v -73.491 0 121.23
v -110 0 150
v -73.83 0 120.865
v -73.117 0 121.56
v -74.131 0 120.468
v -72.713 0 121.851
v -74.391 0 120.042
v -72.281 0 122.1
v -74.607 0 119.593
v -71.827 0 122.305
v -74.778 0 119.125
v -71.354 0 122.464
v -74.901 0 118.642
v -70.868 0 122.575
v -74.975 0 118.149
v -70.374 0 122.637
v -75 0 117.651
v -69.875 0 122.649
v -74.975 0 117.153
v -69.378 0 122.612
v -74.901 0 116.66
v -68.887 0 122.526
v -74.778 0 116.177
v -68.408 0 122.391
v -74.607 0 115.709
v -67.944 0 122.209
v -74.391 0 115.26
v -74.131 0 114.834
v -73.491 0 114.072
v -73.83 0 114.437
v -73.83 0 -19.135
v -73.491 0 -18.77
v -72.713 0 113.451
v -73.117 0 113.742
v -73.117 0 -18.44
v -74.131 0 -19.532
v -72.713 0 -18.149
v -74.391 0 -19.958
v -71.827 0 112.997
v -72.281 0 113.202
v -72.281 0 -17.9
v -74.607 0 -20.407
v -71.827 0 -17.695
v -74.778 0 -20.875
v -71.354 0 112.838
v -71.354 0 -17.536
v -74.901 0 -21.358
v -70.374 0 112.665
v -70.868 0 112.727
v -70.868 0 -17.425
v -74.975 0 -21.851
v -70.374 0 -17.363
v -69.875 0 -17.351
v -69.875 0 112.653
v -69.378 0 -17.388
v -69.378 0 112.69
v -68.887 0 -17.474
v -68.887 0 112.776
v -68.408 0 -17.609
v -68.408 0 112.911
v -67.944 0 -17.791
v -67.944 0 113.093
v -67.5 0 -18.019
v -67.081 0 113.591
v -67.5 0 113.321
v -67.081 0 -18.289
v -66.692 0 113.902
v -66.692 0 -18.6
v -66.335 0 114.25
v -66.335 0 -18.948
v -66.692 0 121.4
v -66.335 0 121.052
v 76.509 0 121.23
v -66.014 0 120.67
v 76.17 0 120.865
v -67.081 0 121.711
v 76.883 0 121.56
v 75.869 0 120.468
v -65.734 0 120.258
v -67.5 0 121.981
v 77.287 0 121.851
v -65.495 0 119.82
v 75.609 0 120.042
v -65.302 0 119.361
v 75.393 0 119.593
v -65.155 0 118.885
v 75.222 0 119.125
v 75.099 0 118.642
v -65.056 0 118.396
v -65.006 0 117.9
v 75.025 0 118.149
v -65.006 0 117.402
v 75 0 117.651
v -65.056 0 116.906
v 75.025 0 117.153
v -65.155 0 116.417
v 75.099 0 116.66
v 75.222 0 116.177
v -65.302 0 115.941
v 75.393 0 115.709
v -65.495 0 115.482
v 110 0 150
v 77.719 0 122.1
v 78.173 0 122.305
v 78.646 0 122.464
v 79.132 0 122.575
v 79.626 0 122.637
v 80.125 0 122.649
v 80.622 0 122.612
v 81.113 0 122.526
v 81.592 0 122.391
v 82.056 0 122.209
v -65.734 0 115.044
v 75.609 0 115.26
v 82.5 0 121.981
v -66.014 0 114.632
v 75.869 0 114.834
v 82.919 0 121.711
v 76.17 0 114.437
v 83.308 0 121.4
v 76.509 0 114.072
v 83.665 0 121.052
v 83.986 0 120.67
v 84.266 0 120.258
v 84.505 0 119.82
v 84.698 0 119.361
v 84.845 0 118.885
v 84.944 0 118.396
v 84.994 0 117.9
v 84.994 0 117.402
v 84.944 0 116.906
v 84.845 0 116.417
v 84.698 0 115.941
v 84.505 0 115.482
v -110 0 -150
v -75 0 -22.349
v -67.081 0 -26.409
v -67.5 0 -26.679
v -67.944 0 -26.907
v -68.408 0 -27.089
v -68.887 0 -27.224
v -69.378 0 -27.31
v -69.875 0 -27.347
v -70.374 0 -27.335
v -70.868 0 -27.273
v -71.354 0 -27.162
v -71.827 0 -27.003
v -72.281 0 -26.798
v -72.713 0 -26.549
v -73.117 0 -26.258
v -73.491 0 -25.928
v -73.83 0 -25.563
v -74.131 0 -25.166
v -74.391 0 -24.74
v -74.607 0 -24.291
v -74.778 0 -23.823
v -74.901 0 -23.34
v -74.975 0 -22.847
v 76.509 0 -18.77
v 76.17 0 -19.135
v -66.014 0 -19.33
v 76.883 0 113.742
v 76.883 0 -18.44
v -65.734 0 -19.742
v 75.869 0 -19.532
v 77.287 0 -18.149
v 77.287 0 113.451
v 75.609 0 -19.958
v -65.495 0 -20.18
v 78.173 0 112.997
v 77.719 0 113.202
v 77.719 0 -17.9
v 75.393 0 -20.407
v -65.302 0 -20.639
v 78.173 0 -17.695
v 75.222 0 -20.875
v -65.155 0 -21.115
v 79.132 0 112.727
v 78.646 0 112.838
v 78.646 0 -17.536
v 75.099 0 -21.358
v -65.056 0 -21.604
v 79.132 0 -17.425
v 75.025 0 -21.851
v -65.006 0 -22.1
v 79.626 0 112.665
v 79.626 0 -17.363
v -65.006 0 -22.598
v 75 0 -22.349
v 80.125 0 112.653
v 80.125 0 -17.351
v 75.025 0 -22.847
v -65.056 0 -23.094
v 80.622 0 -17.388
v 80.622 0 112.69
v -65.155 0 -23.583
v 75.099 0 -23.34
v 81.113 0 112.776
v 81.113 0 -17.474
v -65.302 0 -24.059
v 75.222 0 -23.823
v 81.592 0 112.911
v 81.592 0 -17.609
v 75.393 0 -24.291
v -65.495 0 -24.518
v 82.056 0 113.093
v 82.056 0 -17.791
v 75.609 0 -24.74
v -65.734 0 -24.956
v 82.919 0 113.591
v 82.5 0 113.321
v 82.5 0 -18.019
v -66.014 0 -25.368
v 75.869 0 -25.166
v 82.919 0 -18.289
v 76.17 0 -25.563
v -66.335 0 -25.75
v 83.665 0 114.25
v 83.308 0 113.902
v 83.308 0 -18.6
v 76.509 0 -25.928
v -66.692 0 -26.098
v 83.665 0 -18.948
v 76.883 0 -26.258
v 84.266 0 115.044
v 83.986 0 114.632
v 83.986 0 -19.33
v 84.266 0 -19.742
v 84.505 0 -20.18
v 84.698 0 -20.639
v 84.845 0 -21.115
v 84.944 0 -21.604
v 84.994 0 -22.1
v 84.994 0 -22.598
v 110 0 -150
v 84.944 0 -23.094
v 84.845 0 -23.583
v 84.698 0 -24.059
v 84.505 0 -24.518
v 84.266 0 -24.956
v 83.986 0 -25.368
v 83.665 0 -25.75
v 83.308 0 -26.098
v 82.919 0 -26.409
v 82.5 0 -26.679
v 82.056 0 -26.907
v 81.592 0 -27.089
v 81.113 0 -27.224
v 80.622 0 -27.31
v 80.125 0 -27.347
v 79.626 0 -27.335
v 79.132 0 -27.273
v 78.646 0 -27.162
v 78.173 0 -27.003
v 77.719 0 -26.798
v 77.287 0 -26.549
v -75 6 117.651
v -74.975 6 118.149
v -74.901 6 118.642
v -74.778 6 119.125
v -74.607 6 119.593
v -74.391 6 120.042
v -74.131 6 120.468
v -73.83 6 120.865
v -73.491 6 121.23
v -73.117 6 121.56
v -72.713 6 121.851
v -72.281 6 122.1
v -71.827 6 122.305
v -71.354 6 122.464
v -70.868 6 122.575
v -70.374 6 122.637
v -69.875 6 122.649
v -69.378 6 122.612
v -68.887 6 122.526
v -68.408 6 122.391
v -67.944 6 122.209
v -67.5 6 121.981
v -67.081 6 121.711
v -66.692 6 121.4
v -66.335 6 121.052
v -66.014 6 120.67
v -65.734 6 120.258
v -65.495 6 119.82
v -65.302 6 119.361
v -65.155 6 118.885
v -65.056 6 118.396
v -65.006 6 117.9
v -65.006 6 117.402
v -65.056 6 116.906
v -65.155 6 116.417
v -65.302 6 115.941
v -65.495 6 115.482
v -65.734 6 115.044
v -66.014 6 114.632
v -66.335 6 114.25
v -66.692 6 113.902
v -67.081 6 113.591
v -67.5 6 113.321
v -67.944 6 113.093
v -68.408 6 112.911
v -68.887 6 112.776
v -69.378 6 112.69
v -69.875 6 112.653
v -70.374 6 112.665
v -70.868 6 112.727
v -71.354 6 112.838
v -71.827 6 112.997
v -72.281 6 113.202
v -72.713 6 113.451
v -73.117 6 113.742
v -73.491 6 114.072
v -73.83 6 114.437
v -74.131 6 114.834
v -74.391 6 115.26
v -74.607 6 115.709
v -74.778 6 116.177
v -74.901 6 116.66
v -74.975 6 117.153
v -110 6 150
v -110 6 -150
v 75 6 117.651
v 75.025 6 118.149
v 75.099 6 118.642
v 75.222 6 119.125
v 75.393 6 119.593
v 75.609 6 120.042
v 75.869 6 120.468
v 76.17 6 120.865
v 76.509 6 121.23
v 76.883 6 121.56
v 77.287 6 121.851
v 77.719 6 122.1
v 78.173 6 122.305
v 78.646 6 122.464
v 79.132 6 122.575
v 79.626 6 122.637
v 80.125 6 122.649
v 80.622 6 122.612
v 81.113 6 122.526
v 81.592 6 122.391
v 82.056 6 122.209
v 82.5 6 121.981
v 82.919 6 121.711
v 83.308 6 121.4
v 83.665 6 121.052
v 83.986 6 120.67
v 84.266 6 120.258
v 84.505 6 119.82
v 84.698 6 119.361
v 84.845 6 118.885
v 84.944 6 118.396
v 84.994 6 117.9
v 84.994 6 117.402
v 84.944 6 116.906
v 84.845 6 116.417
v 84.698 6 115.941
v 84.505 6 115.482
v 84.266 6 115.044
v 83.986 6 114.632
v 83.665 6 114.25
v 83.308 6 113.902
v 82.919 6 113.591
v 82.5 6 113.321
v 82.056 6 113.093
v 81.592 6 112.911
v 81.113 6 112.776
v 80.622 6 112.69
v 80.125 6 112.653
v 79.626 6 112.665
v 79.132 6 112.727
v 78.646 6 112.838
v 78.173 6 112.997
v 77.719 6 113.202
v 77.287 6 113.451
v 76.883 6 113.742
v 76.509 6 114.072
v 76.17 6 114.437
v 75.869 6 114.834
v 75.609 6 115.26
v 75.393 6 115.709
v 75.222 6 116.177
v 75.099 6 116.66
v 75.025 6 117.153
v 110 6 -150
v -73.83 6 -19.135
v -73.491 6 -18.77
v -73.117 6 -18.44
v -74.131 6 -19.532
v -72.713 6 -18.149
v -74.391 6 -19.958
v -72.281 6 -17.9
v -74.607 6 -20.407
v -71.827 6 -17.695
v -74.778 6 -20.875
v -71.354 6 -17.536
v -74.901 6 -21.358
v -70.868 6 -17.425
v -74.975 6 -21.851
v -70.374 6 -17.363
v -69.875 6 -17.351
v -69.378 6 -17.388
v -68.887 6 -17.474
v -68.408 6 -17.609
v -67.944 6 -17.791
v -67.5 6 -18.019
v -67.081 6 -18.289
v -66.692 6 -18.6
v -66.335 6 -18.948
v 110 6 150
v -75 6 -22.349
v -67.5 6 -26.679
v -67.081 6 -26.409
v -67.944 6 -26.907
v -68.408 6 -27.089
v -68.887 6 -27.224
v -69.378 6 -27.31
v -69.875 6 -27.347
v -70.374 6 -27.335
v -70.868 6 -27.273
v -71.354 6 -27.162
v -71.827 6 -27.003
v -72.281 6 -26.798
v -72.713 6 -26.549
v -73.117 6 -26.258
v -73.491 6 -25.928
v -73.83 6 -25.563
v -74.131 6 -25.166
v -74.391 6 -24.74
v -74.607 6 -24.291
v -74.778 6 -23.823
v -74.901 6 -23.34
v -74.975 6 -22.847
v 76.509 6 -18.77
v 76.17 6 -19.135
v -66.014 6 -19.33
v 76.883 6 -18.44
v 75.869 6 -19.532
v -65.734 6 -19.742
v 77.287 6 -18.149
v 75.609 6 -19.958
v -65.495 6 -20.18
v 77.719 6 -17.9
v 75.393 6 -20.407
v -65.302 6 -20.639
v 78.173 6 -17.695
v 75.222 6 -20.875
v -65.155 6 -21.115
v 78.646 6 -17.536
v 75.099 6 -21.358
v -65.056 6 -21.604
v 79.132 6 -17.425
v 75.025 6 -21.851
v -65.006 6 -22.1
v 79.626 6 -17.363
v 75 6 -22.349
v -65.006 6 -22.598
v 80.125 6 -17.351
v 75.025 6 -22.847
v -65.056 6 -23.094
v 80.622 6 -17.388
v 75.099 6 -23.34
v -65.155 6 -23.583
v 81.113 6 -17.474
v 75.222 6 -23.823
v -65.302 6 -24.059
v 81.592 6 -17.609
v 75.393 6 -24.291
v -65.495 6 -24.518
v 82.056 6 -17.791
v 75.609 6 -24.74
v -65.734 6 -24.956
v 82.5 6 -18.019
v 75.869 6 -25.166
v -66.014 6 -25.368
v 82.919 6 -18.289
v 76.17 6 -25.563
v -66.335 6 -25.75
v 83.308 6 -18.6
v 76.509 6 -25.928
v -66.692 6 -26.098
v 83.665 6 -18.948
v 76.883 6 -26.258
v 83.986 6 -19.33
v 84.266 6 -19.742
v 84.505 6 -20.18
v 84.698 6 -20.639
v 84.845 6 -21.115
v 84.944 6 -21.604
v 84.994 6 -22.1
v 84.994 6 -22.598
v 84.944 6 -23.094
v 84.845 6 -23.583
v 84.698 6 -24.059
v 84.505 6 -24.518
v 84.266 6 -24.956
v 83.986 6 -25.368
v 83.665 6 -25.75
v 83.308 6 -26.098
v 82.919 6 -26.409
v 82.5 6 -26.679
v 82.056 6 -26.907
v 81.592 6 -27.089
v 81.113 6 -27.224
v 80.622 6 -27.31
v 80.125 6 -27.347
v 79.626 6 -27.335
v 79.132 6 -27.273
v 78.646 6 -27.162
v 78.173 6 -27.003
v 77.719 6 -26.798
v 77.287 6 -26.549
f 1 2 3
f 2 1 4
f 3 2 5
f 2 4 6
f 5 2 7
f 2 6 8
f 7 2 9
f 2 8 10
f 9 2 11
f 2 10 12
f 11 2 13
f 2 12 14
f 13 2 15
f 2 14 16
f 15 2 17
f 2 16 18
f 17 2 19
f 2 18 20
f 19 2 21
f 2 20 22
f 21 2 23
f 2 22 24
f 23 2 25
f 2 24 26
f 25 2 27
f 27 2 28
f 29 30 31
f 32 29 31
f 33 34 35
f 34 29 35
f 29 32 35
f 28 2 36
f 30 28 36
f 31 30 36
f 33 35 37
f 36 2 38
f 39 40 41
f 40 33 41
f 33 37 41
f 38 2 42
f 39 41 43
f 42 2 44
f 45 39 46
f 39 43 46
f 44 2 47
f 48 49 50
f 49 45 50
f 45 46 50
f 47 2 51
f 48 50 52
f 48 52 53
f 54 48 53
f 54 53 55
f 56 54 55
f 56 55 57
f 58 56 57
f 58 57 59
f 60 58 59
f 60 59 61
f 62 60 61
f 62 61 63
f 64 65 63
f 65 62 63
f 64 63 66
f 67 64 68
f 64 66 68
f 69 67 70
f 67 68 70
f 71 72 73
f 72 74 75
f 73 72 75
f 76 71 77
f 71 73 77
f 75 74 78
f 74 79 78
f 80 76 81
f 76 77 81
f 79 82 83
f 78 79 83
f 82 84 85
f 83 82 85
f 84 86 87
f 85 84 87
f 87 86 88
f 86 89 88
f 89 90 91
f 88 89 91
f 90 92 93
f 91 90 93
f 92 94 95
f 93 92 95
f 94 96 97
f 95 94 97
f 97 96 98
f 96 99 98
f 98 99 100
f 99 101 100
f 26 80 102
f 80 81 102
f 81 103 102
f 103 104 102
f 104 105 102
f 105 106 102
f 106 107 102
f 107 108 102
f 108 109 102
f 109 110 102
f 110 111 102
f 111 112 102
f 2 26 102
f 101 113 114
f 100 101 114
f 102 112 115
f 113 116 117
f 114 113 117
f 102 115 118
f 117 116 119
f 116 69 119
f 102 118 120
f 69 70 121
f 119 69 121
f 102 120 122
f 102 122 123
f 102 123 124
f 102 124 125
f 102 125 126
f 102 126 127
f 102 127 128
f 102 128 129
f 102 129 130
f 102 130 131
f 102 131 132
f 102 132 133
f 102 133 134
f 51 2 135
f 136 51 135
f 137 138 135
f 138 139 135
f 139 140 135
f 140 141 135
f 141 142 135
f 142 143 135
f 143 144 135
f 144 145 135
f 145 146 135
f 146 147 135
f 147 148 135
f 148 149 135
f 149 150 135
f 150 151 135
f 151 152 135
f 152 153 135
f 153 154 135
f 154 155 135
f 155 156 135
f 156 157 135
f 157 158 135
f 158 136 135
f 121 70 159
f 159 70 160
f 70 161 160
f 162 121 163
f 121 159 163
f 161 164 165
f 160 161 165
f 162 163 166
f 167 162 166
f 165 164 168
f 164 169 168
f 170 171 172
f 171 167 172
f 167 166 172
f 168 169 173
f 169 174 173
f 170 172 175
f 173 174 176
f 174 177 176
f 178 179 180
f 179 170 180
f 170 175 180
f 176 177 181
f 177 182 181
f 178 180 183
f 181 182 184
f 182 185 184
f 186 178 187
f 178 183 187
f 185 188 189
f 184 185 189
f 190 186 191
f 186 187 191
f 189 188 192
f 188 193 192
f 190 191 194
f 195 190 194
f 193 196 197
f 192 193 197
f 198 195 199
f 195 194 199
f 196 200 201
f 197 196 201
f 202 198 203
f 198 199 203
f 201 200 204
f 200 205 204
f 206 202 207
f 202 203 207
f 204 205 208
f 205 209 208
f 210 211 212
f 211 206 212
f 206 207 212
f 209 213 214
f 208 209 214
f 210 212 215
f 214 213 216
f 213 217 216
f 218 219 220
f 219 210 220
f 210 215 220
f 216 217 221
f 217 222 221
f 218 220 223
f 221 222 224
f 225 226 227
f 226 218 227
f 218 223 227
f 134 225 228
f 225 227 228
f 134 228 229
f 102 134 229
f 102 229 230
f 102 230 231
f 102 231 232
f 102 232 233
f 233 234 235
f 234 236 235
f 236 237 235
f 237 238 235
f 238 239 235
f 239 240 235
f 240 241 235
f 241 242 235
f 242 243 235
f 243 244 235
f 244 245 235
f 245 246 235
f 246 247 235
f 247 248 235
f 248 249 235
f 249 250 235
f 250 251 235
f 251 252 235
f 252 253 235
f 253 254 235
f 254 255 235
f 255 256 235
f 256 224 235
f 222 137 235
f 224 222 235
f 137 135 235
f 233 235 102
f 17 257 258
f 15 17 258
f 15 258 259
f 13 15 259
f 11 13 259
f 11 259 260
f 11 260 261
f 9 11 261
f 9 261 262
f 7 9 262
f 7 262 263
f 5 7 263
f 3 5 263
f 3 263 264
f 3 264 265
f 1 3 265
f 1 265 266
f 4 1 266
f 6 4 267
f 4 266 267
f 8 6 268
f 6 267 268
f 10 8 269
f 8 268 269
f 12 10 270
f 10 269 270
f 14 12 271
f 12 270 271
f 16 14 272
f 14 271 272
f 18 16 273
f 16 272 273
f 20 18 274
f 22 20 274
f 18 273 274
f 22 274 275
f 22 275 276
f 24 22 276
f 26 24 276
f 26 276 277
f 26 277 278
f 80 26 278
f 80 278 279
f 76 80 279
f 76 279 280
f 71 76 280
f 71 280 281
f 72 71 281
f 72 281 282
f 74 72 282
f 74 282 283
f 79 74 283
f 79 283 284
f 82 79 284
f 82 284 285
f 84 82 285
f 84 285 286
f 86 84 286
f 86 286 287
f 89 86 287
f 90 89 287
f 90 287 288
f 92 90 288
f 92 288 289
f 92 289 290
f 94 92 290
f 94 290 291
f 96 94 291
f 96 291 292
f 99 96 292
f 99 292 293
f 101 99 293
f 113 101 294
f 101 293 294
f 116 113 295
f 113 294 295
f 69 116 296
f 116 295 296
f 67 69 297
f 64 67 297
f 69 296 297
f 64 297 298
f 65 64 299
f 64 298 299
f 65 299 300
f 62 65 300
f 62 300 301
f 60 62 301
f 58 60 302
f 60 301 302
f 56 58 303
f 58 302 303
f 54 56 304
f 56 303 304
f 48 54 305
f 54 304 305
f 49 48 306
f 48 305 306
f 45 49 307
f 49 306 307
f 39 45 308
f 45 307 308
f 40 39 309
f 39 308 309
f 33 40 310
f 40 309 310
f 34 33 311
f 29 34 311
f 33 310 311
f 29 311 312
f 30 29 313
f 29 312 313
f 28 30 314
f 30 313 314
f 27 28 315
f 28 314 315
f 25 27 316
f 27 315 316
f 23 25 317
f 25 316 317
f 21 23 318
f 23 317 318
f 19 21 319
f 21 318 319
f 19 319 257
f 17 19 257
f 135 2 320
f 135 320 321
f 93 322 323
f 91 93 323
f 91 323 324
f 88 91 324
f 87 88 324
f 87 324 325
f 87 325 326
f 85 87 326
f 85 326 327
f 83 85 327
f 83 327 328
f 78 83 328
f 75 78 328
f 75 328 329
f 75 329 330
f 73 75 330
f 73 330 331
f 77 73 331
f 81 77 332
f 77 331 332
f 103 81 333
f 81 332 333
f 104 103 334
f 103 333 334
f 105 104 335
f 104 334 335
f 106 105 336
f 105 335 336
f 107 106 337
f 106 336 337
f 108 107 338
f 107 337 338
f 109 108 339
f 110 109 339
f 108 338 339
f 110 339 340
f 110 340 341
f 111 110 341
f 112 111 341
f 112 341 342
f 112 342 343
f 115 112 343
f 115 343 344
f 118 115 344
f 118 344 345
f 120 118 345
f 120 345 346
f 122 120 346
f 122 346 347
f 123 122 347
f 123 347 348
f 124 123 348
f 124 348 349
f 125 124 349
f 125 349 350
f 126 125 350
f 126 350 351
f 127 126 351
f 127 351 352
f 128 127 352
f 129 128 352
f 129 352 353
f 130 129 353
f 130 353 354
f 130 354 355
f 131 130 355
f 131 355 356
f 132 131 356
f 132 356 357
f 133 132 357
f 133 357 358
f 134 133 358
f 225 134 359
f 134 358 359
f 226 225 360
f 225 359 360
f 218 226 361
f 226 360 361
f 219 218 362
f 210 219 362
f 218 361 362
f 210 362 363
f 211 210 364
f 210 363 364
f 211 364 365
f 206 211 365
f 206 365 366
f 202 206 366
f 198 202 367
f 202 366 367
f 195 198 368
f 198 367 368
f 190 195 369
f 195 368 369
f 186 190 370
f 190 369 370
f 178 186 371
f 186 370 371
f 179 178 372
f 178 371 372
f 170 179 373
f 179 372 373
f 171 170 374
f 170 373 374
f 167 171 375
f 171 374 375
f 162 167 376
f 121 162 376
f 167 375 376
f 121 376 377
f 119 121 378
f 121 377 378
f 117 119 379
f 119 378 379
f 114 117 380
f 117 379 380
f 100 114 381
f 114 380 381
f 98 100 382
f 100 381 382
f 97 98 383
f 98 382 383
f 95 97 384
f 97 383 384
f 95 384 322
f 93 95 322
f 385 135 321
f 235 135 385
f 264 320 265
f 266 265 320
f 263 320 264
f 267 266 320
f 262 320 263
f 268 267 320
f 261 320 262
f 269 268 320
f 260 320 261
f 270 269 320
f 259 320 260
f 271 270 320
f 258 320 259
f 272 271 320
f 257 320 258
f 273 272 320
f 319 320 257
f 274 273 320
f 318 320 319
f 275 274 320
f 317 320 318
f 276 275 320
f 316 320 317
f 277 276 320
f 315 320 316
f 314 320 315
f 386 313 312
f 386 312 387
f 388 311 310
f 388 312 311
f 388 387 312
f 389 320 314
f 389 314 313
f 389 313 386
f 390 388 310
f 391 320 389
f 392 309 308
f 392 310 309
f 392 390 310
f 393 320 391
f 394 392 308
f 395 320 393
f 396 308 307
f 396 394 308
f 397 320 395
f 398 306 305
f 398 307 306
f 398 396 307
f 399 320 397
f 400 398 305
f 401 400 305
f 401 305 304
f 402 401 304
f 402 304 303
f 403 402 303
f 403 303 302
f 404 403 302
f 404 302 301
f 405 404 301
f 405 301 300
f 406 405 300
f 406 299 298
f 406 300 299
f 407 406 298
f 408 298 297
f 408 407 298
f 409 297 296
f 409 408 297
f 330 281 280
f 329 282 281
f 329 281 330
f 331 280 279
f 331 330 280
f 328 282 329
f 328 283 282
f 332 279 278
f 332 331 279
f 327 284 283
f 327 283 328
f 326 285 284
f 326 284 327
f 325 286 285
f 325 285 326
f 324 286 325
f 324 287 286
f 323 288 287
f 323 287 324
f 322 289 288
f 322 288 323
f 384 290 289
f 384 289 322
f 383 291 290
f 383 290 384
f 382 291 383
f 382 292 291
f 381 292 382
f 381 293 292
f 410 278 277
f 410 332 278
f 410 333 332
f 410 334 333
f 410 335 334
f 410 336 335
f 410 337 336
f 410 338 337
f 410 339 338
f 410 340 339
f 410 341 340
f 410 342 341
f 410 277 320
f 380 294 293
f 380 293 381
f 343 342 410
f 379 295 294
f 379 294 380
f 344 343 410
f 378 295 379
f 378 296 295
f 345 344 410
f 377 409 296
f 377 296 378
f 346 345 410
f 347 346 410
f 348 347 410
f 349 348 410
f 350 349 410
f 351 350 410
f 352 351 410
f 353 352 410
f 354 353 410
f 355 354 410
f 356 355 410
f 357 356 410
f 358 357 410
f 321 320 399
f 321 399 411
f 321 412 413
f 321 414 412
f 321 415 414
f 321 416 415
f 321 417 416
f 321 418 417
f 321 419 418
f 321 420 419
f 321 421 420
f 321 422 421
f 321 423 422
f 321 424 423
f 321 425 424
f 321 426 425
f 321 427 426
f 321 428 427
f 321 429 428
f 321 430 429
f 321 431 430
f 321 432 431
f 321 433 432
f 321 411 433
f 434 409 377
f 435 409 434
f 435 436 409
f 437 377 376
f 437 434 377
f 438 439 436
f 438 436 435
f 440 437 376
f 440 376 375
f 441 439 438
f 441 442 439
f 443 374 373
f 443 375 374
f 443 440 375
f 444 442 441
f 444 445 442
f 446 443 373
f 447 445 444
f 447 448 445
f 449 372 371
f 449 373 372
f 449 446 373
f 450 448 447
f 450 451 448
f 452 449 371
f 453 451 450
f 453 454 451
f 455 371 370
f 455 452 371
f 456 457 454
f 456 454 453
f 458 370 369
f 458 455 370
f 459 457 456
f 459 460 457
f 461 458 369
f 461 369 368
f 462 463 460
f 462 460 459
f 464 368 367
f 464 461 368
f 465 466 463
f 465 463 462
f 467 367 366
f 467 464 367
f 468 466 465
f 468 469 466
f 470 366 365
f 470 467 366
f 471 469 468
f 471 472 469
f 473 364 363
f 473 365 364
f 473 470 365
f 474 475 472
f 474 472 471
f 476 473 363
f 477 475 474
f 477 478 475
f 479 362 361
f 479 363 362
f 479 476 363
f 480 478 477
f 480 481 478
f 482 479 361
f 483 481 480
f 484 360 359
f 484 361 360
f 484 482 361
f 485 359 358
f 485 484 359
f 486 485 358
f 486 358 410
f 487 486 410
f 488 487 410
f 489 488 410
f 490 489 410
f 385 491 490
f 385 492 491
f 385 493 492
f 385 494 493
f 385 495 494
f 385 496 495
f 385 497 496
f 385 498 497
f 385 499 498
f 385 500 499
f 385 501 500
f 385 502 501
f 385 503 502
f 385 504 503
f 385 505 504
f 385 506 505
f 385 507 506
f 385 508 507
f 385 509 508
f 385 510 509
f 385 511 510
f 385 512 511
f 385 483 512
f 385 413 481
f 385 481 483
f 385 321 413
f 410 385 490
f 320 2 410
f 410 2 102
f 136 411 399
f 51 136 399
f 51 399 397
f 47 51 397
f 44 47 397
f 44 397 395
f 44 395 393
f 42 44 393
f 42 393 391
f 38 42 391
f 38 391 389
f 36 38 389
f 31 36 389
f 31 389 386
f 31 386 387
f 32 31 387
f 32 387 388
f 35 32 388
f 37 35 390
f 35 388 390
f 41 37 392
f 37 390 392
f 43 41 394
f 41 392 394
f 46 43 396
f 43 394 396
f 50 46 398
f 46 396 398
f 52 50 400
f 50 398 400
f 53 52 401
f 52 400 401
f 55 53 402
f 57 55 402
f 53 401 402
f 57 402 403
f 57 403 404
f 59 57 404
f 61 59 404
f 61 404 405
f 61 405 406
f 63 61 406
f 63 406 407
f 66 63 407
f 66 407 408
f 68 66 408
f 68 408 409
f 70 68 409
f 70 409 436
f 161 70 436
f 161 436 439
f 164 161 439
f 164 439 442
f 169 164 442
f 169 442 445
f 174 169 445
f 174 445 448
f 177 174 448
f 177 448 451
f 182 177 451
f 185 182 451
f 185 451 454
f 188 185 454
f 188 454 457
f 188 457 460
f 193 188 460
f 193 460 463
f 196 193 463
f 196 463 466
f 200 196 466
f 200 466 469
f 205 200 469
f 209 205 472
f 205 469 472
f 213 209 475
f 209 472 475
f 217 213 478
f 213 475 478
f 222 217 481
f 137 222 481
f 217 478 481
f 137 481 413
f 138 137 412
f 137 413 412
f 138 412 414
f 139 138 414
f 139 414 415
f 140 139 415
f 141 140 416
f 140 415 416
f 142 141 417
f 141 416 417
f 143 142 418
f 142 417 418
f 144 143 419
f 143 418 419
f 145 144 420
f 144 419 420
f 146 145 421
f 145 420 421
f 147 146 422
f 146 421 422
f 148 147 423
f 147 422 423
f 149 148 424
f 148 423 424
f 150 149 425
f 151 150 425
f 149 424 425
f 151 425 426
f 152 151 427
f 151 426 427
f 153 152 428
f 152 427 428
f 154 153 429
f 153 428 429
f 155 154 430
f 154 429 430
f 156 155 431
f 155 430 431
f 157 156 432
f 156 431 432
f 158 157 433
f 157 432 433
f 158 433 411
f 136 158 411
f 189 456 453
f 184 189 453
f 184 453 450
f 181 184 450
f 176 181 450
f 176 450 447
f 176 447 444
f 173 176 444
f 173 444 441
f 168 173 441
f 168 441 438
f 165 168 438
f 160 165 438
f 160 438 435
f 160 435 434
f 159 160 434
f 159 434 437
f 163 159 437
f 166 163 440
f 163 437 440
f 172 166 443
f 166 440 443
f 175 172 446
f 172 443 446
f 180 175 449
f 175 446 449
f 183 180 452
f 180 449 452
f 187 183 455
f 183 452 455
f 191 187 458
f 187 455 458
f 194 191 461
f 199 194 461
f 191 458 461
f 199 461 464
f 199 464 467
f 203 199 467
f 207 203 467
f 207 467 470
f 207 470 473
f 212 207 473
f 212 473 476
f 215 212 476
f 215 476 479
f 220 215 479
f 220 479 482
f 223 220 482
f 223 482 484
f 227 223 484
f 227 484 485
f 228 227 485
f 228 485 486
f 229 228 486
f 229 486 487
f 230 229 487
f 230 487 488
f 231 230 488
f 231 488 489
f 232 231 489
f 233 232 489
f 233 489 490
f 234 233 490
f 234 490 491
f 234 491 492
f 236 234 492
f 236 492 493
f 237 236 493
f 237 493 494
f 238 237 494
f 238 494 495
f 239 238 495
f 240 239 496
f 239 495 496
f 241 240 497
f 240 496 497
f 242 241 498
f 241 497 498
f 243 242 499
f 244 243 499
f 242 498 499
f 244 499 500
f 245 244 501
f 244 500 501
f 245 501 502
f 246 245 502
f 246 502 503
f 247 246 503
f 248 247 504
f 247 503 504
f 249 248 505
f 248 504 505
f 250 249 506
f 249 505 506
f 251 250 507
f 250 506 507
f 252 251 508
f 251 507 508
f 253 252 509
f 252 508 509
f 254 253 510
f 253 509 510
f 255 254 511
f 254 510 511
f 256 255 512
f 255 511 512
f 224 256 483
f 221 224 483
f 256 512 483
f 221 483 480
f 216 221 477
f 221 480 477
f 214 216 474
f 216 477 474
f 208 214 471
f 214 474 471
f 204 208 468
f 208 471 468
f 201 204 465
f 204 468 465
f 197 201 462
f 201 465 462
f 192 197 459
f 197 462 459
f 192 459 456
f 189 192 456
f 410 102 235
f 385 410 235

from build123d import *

# Parameters (mm, degrees)
SKETCH1_W                      = 220
SKETCH1_H                      = 300
BOSS_EXTRUDE1_DEPTH            = 6
F_10_0_10_DIAMETER_HOLE1_D     = 10
F_10_0_10_DIAMETER_HOLE1_DEPTH = 11
F_10_0_10_DIAMETER_HOLE1_TIP   = 3.004303095


with BuildPart() as part:
    # Sketch1 → Boss-Extrude1 (new body)
    with BuildSketch(Plane(origin=(0, 0, 0), x_dir=(1, 0, 0), z_dir=(0, 1, 0))):
        Rectangle(SKETCH1_W, SKETCH1_H)
    extrude(amount=BOSS_EXTRUDE1_DEPTH)

    # Ø10.0 (10) Diameter Hole1
    with Locations(Plane.XZ):
        with Locations((-70, 117.650973616), (80, 117.650973616), (80, -22.349026384), (-70, -22.349026384)):
            Hole(F_10_0_10_DIAMETER_HOLE1_D / 2, depth=F_10_0_10_DIAMETER_HOLE1_DEPTH)
            with Locations((0, 0, -(F_10_0_10_DIAMETER_HOLE1_DEPTH + F_10_0_10_DIAMETER_HOLE1_TIP / 2))):  # 118° drill point
                Cone(0, F_10_0_10_DIAMETER_HOLE1_D / 2, F_10_0_10_DIAMETER_HOLE1_TIP, mode=Mode.SUBTRACT)


solid = part.part
